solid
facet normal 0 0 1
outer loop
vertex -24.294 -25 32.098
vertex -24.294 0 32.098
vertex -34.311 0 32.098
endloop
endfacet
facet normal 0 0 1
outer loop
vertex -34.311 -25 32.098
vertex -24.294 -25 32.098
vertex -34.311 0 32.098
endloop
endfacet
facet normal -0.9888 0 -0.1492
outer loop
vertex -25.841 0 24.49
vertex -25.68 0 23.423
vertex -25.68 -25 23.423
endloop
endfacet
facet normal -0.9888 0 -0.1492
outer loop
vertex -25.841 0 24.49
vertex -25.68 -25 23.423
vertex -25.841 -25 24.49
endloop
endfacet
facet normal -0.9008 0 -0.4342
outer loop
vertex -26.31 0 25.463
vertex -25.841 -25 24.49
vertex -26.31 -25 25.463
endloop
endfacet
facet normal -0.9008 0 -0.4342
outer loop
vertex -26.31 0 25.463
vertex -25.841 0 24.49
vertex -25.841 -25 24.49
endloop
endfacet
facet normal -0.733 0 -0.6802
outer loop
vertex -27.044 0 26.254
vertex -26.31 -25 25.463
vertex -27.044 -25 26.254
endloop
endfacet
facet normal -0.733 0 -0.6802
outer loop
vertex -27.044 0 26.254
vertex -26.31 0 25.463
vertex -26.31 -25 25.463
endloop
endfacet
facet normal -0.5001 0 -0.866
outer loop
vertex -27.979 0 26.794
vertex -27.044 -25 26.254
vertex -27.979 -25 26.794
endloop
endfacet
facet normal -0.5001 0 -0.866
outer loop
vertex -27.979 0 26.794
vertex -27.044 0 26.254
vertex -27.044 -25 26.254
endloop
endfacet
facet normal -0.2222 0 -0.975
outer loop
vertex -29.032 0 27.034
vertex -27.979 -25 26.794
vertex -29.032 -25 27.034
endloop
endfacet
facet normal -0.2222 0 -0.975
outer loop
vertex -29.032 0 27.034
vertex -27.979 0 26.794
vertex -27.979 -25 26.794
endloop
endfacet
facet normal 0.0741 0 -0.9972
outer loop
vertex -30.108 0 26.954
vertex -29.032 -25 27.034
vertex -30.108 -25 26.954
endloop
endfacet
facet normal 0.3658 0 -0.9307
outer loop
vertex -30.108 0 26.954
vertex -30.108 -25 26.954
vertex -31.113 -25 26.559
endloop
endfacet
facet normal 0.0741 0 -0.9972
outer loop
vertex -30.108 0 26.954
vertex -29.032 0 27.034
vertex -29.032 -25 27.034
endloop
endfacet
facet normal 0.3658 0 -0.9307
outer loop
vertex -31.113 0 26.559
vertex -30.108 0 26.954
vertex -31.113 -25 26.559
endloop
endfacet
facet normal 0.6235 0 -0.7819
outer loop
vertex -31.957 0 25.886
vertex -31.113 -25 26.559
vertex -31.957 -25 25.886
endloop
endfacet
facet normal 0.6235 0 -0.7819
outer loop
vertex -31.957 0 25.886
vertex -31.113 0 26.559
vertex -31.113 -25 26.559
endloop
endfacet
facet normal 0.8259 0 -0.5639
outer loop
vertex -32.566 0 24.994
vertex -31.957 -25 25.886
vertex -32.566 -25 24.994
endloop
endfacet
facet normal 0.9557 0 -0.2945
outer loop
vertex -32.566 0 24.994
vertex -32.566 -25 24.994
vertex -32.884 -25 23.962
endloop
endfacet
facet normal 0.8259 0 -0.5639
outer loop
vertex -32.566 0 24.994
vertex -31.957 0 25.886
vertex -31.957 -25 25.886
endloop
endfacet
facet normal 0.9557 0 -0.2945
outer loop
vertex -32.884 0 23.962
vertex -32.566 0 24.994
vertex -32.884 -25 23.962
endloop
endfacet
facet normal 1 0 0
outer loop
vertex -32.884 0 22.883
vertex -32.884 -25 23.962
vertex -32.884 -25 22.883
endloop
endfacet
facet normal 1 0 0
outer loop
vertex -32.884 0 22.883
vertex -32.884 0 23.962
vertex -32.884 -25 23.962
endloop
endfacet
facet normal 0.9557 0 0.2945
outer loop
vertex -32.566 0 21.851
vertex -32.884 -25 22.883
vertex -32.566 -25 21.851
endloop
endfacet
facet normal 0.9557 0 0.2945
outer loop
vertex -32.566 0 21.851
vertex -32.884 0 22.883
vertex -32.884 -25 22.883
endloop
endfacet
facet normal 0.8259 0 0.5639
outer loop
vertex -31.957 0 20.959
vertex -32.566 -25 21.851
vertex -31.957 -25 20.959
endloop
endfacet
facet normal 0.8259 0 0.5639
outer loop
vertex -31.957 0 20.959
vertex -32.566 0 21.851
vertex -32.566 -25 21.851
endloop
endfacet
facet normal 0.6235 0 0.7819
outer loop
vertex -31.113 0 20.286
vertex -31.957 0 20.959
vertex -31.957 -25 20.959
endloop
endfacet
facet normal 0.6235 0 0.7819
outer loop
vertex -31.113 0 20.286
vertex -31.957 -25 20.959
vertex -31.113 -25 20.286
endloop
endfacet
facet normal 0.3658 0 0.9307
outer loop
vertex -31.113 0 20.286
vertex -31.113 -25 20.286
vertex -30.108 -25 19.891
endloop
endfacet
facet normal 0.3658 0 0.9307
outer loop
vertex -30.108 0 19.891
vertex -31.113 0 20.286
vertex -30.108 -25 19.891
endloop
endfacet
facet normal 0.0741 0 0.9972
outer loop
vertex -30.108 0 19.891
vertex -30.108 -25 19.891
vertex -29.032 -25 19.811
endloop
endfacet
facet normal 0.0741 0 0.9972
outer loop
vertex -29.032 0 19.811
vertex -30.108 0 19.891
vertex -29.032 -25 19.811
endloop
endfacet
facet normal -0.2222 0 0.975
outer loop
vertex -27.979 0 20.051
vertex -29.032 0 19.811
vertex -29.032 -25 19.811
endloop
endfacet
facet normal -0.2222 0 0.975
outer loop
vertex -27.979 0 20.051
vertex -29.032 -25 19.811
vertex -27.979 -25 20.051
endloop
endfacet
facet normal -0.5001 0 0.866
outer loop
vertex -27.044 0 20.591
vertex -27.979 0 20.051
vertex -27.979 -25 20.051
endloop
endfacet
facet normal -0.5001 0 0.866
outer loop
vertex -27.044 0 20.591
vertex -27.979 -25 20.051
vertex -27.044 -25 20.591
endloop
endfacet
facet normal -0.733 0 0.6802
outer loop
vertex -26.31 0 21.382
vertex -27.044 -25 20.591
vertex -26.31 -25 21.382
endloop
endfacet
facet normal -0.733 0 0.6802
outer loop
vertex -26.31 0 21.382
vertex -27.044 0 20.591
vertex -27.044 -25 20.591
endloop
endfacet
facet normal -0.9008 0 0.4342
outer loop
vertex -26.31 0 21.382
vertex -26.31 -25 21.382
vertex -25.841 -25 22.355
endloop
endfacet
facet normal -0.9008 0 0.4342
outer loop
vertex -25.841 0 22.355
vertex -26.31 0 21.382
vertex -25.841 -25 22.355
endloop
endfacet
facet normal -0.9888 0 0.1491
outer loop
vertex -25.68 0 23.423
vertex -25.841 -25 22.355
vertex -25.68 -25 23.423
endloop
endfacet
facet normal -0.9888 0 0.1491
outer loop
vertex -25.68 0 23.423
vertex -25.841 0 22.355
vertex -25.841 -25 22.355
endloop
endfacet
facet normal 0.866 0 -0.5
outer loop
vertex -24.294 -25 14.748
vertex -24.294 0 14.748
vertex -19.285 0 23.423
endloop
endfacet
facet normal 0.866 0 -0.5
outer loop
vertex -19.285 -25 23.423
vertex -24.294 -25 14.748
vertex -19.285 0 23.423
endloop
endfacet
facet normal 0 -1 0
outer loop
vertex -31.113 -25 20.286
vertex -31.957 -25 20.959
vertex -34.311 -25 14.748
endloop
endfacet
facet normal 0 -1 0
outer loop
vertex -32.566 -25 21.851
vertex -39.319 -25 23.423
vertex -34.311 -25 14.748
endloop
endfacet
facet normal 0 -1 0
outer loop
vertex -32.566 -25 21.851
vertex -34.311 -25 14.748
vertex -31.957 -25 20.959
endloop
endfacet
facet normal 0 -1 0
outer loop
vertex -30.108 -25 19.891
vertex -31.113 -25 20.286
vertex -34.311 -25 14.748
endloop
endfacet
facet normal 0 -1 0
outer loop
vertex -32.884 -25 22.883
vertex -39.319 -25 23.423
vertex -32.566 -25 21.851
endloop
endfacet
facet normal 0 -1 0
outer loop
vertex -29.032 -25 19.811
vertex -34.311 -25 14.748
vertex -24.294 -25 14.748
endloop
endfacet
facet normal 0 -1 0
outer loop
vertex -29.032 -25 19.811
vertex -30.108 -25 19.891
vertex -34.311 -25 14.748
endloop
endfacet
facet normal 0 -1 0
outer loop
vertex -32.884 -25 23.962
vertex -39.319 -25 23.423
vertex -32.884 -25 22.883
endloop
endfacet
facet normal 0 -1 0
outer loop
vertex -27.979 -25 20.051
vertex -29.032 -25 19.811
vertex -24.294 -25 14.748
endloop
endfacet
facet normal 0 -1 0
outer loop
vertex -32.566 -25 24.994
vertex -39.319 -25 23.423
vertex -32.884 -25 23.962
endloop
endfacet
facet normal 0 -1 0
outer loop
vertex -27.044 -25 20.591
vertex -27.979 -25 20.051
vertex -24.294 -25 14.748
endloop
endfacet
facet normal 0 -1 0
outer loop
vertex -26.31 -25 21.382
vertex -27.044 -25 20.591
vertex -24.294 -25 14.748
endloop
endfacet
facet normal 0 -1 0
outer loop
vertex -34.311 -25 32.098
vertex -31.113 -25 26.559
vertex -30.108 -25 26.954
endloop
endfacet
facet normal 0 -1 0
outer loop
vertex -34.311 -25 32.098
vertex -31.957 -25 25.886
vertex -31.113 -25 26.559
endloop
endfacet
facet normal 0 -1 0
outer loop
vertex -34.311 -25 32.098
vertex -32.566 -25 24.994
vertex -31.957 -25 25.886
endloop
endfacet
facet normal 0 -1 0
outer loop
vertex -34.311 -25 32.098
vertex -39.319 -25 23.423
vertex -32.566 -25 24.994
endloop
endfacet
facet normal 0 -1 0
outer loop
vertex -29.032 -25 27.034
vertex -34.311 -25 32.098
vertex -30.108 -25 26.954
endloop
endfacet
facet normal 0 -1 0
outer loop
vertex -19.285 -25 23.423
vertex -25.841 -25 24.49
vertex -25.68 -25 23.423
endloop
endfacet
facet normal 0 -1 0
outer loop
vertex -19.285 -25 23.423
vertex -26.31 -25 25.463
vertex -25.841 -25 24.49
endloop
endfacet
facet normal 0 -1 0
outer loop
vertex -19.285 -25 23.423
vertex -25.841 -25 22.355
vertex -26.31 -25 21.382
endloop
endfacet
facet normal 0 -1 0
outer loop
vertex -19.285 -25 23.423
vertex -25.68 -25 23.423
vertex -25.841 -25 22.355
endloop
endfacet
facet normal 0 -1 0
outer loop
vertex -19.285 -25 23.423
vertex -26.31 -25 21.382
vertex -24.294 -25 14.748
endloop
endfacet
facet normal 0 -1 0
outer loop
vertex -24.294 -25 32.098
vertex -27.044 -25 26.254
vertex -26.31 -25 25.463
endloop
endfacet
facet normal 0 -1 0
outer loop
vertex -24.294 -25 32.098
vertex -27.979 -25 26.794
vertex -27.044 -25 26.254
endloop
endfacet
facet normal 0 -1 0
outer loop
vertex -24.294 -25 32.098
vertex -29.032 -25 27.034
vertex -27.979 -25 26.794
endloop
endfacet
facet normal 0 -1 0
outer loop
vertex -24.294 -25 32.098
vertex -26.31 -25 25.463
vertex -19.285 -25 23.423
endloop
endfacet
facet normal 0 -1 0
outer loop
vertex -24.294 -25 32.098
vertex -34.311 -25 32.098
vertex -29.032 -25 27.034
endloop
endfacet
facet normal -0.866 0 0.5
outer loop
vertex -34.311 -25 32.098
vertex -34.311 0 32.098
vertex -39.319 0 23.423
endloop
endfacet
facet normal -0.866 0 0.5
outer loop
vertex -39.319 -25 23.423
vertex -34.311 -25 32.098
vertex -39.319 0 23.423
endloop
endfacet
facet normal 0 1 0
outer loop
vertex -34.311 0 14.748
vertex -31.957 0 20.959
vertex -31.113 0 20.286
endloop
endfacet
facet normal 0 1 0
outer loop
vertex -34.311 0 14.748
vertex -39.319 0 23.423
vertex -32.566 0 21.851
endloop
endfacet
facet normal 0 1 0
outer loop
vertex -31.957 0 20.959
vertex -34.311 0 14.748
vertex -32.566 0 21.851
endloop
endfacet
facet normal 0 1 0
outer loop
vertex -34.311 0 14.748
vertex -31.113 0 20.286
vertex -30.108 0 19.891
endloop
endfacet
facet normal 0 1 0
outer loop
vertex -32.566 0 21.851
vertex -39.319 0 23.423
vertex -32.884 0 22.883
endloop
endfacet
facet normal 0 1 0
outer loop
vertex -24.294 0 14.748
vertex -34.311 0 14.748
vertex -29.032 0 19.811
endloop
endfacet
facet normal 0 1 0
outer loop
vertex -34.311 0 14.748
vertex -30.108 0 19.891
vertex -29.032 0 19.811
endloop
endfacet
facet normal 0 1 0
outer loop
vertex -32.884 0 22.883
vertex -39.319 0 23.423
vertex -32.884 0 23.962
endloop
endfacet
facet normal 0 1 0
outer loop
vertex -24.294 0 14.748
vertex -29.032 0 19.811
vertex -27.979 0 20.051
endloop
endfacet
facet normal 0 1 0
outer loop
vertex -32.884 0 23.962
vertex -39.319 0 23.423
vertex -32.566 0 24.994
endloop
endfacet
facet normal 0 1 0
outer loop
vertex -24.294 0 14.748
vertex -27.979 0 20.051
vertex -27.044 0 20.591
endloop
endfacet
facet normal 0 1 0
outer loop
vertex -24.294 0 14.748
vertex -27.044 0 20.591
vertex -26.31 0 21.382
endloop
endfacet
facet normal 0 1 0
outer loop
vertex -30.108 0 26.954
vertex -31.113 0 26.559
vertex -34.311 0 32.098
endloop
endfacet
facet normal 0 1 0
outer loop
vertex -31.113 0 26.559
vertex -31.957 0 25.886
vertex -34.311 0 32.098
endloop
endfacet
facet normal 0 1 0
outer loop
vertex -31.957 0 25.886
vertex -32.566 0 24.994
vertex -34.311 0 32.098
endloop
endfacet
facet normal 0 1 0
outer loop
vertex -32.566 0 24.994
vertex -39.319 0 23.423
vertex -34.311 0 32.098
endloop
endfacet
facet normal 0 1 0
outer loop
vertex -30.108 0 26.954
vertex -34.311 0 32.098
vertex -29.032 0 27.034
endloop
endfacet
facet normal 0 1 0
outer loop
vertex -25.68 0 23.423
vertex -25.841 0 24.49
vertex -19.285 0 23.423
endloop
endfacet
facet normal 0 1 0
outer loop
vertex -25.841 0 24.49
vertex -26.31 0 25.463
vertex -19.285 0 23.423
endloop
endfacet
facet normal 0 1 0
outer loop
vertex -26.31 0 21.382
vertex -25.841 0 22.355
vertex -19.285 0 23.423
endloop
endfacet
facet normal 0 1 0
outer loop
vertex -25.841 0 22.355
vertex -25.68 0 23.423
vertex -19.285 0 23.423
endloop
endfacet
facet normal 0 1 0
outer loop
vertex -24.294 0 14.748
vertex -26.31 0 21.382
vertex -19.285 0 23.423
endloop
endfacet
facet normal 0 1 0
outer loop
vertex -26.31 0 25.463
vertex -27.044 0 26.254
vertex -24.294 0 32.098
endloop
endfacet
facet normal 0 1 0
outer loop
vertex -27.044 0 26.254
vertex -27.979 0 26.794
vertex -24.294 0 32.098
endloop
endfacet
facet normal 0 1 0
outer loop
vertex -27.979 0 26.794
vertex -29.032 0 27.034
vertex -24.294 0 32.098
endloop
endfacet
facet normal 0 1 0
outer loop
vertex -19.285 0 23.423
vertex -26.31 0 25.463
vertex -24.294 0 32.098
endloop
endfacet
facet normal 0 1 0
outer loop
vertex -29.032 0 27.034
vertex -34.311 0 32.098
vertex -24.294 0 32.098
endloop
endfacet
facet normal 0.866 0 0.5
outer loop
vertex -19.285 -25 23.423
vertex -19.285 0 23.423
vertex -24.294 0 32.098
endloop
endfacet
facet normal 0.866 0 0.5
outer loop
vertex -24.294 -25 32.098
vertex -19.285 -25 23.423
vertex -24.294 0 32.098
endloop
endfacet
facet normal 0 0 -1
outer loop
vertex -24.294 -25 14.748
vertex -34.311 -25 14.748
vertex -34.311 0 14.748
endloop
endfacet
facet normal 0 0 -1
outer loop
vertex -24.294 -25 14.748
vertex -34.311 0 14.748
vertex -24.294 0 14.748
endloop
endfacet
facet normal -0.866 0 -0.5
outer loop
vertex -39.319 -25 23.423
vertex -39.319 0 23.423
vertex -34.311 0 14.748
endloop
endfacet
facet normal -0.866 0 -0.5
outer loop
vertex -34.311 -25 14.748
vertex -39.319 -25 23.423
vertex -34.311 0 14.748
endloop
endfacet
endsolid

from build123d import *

# Parameters (mm, degrees)
F0_R     = 3.62198
F1_DEPTH = 25
F2_DEPTH = 25


with BuildPart() as f1:
    # F0 (on Front) → F1 (new body)
    with BuildSketch(Plane.XZ):
        Polygon((-24.293795, 32.097615), (-34.310859, 32.097615), (-39.31939, 23.422584), (-34.310859, 14.747553), (-24.293795, 14.747553), (-19.285264, 23.422584), align=None)
        with Locations((-29.302327, 23.422584)):
            Circle(F0_R, mode=Mode.SUBTRACT)
        with Locations((-29.302327, 23.422584)):
            Circle(F0_R)
    extrude(amount=F1_DEPTH)

    # F0 (on Front) → F2 (cut)
    with BuildSketch(Plane.XZ):
        with Locations((-29.302327, 23.422584)):
            Circle(F0_R)
    extrude(amount=F2_DEPTH, mode=Mode.SUBTRACT)


solid = f1.part
